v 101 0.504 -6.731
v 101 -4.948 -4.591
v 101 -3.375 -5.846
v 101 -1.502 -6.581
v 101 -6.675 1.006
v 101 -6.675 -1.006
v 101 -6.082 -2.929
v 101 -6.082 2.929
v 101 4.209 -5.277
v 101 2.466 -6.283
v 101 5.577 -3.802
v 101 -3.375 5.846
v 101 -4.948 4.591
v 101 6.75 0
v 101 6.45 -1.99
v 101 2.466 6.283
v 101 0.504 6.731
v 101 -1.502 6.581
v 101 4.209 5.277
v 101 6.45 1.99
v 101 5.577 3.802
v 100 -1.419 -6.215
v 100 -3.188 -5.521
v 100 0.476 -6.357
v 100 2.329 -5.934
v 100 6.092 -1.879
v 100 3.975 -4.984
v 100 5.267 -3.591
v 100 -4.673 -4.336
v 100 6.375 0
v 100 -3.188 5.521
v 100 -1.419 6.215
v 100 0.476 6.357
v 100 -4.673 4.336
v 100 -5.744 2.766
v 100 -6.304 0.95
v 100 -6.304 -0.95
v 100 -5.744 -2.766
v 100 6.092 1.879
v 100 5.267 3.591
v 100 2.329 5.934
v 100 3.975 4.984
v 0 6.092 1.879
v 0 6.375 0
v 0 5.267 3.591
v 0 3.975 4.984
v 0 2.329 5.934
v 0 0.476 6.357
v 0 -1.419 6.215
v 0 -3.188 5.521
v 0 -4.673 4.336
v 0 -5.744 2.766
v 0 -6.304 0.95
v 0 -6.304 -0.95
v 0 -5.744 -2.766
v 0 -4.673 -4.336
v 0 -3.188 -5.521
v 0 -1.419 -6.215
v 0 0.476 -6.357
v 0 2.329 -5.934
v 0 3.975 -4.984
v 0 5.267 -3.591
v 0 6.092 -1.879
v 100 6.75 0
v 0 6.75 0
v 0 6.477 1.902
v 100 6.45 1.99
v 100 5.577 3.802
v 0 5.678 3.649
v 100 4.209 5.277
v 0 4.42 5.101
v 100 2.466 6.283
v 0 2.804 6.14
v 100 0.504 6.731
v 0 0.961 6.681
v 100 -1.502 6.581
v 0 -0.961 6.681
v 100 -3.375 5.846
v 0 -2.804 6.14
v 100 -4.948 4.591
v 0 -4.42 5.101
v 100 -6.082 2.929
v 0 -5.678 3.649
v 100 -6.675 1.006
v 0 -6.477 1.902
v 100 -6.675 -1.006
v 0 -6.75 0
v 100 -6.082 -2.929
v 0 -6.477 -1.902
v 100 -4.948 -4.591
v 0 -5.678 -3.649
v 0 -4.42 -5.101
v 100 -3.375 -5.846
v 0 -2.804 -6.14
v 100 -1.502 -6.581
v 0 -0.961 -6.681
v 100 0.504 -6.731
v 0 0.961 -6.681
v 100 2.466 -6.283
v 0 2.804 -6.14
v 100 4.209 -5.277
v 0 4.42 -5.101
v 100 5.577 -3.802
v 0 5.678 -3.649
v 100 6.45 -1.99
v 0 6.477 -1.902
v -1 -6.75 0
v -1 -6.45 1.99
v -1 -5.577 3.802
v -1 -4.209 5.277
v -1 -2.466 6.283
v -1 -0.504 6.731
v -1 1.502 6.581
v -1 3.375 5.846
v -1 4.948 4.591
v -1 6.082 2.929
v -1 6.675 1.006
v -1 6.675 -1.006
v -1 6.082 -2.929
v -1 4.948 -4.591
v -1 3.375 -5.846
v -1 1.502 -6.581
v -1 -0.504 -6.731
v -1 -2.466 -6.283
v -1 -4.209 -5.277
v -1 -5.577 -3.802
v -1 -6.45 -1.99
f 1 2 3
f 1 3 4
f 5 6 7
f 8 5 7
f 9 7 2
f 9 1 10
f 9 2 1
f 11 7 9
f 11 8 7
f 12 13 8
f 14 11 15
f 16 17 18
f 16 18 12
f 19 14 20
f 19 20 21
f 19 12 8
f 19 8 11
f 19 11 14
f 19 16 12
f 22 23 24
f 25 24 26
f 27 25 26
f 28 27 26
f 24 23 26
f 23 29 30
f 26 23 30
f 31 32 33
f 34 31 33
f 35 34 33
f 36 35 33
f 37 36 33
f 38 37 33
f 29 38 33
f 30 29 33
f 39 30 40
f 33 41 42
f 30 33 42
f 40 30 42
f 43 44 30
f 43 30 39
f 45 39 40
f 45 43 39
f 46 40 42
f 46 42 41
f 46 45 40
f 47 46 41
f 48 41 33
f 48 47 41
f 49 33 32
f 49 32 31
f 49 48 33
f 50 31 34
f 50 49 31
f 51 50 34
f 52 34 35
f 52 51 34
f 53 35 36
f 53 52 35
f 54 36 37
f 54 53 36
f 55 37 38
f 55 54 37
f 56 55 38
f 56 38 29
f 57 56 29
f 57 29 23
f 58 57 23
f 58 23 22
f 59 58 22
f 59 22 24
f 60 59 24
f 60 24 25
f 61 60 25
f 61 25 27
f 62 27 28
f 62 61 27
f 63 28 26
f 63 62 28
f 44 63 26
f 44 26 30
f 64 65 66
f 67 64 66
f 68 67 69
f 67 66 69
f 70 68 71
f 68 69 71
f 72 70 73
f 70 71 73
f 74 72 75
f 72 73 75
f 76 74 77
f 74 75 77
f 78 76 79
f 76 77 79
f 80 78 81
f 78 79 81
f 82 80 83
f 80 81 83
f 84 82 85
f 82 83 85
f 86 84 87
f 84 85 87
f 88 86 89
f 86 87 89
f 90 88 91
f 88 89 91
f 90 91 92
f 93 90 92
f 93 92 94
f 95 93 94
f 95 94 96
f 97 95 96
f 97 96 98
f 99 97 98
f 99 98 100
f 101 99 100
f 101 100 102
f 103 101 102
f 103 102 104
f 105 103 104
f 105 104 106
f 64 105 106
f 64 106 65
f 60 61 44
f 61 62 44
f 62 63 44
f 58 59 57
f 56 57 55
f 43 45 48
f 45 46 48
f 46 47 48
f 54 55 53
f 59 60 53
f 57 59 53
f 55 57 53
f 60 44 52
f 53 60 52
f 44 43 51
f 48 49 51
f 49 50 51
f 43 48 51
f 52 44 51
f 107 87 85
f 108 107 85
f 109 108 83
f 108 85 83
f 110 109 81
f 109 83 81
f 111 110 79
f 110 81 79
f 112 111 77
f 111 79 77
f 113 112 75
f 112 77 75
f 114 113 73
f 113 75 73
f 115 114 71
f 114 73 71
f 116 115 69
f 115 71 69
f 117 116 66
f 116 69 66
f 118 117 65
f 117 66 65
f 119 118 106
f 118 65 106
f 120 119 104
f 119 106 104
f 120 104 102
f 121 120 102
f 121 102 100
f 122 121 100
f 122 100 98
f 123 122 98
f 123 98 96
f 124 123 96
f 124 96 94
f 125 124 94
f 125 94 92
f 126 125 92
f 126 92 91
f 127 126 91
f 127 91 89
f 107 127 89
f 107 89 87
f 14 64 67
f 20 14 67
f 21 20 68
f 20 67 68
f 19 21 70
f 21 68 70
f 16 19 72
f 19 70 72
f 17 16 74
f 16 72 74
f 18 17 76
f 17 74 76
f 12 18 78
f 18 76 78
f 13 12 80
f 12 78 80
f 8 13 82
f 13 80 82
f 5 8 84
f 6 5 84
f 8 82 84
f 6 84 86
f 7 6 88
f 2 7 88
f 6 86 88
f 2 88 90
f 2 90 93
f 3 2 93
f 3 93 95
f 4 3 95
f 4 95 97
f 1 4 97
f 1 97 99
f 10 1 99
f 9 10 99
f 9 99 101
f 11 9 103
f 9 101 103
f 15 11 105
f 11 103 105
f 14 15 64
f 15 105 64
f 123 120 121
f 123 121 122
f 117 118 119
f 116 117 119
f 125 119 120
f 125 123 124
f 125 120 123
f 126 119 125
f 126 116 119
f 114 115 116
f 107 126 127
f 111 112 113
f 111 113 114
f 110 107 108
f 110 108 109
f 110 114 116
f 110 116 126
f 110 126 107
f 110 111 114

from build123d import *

# Parameters (mm, degrees)
F0_R     = 6.75
F0_R_2   = 6.375
F1_DEPTH = 100
F2_R     = 6.75
F3_DEPTH = 1
F4_R     = 6.75
F5_DEPTH = 1


with BuildPart() as f1:
    # F0 (on Right) → F1 (new body)
    with BuildSketch(Plane.YZ):
        Circle(F0_R)
        Circle(F0_R_2, mode=Mode.SUBTRACT)
    extrude(amount=F1_DEPTH)

    # F2 (on face) → F3 (join)
    with BuildSketch(Plane(origin=(0, 0, 0), x_dir=(0, -1, 0), z_dir=(-1, 0, 0))):
        Circle(F2_R)
    extrude(amount=F3_DEPTH)

    # F4 (on face) → F5 (join)
    with BuildSketch(Plane.YZ.offset(100)):
        Circle(F4_R)
    extrude(amount=F5_DEPTH)


solid = f1.part
